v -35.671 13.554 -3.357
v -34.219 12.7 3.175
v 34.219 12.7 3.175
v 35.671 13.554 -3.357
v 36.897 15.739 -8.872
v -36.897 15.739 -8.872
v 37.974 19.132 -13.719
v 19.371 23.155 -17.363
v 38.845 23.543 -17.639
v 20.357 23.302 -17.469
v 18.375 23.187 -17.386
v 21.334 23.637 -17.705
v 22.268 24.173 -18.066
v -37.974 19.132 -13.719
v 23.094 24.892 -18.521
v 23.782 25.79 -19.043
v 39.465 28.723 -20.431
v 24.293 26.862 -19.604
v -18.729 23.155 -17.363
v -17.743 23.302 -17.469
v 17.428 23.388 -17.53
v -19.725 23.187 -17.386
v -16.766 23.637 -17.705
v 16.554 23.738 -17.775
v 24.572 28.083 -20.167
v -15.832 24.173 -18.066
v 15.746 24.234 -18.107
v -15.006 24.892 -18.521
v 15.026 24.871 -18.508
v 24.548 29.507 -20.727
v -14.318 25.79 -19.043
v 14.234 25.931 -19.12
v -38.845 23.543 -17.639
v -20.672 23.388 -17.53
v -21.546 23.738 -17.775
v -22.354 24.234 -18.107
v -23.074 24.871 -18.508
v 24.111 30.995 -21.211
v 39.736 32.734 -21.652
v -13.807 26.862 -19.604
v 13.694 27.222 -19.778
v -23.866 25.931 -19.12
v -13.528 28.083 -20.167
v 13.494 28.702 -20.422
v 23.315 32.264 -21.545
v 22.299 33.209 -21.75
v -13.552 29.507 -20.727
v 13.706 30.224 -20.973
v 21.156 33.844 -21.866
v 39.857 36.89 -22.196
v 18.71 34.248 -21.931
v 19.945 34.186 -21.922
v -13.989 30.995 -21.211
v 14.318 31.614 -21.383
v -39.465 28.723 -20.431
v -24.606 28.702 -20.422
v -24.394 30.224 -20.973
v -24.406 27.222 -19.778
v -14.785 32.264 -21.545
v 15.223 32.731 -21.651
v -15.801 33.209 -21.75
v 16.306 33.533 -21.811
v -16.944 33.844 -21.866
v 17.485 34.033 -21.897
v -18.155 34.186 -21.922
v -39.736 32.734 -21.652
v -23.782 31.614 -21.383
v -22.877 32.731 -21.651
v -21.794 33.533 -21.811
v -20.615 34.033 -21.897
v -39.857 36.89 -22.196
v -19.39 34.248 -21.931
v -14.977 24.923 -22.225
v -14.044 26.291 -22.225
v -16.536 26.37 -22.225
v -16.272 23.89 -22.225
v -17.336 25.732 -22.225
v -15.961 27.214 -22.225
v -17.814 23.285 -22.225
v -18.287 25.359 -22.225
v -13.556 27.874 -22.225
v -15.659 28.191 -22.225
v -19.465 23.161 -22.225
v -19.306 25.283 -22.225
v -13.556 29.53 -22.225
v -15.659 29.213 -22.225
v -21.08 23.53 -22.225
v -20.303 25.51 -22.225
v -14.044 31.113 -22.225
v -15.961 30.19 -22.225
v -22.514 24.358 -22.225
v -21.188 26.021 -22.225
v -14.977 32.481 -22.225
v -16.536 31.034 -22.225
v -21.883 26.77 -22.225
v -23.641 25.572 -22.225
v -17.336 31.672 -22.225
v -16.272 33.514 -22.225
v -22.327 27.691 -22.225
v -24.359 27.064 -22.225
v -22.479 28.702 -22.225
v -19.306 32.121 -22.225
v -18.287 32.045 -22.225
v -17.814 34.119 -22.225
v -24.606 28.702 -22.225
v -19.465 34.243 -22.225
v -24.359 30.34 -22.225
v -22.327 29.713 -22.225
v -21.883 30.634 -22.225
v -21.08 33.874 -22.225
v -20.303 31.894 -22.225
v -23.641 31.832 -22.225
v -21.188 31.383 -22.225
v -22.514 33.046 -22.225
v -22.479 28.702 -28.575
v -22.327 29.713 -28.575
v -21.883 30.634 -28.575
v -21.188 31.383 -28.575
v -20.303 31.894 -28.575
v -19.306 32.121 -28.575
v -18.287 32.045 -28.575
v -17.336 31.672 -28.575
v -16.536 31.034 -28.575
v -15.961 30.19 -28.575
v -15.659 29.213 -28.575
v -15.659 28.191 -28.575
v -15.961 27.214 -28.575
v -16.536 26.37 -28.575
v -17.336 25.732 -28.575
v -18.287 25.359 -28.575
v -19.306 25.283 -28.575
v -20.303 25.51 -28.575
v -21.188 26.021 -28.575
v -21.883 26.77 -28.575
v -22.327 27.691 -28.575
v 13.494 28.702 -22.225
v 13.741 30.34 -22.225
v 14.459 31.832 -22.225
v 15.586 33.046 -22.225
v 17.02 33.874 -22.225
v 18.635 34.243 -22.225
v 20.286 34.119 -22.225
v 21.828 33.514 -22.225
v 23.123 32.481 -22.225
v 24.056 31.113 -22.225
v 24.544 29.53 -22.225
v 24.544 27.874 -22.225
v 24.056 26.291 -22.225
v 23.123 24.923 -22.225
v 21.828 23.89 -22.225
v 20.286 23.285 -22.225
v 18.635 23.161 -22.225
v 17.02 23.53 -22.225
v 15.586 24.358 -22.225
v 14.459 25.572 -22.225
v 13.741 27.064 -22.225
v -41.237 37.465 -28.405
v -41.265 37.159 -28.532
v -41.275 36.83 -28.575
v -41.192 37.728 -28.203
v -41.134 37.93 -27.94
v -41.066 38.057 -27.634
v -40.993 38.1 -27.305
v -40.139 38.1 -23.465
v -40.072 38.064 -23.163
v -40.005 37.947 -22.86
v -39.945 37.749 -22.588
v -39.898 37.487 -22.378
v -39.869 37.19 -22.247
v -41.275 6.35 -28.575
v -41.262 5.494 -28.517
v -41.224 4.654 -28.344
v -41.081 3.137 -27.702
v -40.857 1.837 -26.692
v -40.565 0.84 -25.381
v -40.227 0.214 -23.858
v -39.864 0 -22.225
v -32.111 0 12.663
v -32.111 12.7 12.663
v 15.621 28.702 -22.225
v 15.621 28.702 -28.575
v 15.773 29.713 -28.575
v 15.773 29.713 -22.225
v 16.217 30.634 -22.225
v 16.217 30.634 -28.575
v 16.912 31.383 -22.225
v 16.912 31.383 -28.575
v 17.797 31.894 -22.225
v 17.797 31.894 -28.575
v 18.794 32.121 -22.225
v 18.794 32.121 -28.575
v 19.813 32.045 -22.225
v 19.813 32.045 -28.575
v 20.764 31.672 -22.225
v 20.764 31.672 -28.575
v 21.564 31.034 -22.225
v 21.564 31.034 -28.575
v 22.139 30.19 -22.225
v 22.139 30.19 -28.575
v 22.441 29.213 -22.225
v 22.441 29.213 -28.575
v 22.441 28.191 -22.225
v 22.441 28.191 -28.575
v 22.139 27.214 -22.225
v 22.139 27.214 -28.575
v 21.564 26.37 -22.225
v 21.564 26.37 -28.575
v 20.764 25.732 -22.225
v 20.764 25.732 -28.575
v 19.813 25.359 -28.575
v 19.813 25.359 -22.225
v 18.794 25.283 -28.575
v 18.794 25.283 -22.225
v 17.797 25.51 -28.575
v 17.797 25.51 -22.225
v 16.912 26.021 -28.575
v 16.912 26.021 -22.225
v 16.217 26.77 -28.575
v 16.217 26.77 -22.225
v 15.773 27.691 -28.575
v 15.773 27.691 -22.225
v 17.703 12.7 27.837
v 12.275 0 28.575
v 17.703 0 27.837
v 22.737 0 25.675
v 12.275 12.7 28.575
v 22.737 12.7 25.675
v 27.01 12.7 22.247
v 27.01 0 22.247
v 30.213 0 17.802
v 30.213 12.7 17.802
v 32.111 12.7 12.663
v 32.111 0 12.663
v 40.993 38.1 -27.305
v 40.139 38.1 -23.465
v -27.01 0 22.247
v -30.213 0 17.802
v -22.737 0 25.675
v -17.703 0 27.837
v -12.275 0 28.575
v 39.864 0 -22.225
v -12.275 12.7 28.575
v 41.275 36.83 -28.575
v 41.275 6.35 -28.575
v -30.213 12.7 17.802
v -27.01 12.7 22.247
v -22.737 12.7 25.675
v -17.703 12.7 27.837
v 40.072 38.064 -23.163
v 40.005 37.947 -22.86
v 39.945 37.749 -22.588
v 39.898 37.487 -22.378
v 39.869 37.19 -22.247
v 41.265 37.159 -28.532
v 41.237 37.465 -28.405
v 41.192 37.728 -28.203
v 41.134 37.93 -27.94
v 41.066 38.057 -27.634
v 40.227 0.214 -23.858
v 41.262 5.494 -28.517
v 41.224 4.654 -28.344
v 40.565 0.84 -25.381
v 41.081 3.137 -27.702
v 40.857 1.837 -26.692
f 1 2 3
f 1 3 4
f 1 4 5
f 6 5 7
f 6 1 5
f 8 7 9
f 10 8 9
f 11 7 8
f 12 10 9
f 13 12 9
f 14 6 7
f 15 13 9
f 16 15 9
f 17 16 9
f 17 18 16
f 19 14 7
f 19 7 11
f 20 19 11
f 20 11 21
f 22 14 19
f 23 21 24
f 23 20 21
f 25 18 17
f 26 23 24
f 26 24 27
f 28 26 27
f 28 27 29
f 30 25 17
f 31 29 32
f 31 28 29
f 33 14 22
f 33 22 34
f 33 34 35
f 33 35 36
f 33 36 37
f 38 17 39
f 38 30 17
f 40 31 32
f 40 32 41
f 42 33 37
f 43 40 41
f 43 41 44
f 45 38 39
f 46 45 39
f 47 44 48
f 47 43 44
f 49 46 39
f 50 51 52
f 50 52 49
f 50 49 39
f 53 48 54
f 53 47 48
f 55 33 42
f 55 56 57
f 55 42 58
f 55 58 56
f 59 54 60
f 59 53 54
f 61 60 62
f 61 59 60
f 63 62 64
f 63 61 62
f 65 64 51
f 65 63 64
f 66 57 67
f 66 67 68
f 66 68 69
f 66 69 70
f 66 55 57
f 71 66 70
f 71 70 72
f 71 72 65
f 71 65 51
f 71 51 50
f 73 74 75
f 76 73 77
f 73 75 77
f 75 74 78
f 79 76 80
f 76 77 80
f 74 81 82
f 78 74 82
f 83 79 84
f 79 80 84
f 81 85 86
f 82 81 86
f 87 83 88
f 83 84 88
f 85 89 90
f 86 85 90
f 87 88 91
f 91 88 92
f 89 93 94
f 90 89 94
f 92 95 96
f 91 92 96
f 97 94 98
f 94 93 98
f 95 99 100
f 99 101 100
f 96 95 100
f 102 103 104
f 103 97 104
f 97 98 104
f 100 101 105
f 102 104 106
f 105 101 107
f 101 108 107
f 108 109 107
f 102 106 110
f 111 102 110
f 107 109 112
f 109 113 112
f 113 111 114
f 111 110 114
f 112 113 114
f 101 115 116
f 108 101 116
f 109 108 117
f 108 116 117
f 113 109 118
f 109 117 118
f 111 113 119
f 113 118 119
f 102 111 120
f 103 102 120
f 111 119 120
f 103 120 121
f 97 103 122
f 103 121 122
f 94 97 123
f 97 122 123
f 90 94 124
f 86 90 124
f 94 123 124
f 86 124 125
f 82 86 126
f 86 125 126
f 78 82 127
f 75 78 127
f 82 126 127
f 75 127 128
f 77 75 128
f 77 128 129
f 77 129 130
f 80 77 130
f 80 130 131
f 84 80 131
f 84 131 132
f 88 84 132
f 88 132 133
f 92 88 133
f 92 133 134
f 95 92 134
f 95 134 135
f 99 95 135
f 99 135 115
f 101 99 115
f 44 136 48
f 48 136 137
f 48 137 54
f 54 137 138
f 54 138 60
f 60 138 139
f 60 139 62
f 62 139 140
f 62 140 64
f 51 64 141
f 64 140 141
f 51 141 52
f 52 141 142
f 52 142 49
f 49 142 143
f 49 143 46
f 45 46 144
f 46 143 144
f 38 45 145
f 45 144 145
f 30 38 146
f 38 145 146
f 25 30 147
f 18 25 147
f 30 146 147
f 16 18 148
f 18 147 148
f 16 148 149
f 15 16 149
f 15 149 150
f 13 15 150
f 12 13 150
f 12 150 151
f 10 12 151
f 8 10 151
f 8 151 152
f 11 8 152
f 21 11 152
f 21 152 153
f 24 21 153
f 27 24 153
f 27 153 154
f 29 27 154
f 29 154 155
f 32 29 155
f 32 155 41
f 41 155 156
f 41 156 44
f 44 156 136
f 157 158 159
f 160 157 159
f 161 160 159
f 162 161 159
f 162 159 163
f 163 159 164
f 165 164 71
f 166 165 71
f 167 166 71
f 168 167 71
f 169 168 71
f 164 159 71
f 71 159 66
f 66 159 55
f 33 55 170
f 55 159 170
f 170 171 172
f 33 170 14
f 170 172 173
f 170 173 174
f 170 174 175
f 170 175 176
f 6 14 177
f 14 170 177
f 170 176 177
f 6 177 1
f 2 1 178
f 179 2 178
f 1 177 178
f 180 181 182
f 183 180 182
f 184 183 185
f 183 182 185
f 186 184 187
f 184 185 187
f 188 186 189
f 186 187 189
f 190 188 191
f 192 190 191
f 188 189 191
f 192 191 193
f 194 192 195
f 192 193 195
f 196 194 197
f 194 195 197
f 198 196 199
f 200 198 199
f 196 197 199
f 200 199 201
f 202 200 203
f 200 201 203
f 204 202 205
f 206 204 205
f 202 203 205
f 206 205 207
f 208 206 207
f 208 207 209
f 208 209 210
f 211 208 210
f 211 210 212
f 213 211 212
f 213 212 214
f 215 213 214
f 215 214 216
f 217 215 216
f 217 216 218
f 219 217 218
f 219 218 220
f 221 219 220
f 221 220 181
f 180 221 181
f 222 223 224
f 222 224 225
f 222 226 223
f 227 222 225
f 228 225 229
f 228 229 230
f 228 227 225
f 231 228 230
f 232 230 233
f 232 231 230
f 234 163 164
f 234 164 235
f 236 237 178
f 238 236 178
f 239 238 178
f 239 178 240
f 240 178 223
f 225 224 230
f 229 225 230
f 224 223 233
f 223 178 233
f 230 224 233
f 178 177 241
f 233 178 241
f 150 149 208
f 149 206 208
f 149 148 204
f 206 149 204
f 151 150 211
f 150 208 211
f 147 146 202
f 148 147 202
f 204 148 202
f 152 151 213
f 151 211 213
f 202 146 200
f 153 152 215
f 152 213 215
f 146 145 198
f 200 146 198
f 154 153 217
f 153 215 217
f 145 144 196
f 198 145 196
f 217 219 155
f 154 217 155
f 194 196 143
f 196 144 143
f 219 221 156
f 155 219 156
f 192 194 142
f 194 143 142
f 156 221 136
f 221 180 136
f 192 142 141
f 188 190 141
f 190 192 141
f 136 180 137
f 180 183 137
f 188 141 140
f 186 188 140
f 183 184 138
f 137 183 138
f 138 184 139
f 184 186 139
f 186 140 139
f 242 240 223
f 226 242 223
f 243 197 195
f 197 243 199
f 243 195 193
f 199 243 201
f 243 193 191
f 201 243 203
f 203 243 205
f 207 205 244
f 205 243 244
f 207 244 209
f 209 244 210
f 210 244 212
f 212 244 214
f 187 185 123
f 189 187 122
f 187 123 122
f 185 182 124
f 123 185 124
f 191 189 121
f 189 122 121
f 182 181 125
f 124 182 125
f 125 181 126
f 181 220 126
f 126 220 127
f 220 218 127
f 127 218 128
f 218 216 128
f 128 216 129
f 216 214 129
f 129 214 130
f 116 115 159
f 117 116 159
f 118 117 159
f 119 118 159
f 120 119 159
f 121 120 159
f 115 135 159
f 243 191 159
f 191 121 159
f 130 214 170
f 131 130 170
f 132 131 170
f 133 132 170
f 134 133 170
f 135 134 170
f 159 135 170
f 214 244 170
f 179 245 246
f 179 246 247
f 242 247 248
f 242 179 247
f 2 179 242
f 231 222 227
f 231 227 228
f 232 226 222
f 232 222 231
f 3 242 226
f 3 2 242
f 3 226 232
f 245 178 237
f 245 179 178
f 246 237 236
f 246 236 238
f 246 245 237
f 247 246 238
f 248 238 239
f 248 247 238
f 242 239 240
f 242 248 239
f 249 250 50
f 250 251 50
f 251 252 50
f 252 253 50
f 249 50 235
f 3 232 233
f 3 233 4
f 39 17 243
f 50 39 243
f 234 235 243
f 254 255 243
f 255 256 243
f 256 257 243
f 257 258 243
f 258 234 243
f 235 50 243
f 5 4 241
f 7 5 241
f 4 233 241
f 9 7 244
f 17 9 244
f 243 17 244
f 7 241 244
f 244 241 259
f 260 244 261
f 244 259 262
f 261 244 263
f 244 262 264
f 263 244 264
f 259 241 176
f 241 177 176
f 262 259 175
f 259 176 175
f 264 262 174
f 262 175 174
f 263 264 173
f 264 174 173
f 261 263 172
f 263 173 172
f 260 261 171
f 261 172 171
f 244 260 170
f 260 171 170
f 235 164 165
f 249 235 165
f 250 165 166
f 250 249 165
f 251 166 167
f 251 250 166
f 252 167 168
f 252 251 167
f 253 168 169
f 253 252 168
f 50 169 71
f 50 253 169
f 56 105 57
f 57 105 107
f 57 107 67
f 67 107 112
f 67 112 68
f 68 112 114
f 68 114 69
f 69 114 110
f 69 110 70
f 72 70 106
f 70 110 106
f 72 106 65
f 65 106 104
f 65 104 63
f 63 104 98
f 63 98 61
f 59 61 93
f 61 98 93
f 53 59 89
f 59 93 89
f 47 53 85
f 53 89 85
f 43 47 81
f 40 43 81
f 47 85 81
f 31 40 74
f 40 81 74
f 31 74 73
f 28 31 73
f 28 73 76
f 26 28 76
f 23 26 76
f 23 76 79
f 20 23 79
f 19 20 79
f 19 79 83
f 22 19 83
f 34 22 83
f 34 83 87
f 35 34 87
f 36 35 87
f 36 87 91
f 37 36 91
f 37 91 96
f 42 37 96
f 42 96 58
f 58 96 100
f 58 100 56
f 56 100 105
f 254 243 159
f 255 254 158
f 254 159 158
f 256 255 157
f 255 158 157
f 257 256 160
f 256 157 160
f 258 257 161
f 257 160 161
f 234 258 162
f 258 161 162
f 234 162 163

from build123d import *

# Parameters (mm, degrees)
BOSS_EXTRUDE1_DEPTH     = 12.7
BOSS_EXTRUDE2_DEPTH     = 38.1
FILLET1_R               = 25.4
FILLET2_R               = 20.32
FILLET3_R               = 6.35
FILLET4_R               = 1.2699999999999994
CUT_EXTRUDE5_REACH      = 82.133
CUT_EXTRUDE5_END_RADIUS = 25.400000000000002
SKETCH6_R               = 3.4289999999999985
CUT_EXTRUDE6_REACH      = 77.736
CUT_EXTRUDE6_END_RADIUS = 25.400000000000002
SKETCH7_R               = 5.55625
SKETCH7_R_2             = 5.556250000000004


with BuildPart() as part:
    # Sketch1 → Boss-Extrude1 (new body)
    with BuildSketch(Plane(origin=(0, 0, 0), x_dir=(1, 0, 0), z_dir=(0, 1, 0))):
        Polygon((39.86388888888888, 22.225000000000012), (-39.86388888888888, 22.225), (-28.574999999999996, -28.57499999999998), (28.575000000000006, -28.574999999999978), align=None)
        Polygon((41.27499999999999, 28.575000000000014), (-41.275000000000006, 28.575000000000003), (-39.863888888888894, 22.225), (39.86388888888888, 22.225000000000012), align=None)
    extrude(amount=BOSS_EXTRUDE1_DEPTH)

    # Sketch1<5> → Boss-Extrude2 (add)
    with BuildSketch(Plane(origin=(0, 0, 0), x_dir=(1, 0, 0), z_dir=(0, 1, 0))):
        Polygon((41.27499999999999, 28.575000000000014), (-41.275000000000006, 28.575000000000003), (-39.863888888888894, 22.225), (39.86388888888888, 22.225000000000012), align=None)
    extrude(amount=BOSS_EXTRUDE2_DEPTH)

    # Fillet1
    fillet1_edges = [part.edges().sort_by_distance(p)[0] for p in [
        (0, 12.7, -22.22500000000001),
    ]]
    fillet(fillet1_edges, radius=FILLET1_R - 0.0001)  # a hair under: the kernel refuses the full size

    # Fillet2
    fillet2_edges = [part.edges().sort_by_distance(p)[0] for p in [
        (28.575000000000006, 6.35, 28.574999999999978),
        (-28.574999999999996, 6.35, 28.57499999999998),
    ]]
    fillet(fillet2_edges, radius=FILLET2_R)

    # Fillet3
    fillet3_edges = [part.edges().sort_by_distance(p)[0] for p in [
        (-7.11e-15, 0, -28.57500000000001),
    ]]
    fillet(fillet3_edges, radius=FILLET3_R)

    # Fillet4
    fillet4_edges = [part.edges().sort_by_distance(p)[0] for p in [
        (0, 38.1, -22.22500000000001),
        (-7.11e-15, 38.1, -28.57500000000001),
    ]]
    fillet(fillet4_edges, radius=FILLET4_R)

    # Cut-Extrude5: up to this cylinder (the profile starts outside it)
    cut_extrude5_end = Plane(origin=(3.97e-15, 38.1, 3.1749999999999905), z_dir=(-1, 0, 1.3e-16)) * Cylinder(CUT_EXTRUDE5_END_RADIUS, 254.166, mode=Mode.PRIVATE)
    # Sketch6 → Cut-Extrude5 (cut, up to the surface)
    with BuildSketch(Plane(origin=(-3.6e-15, 0, -28.57500000000001), x_dir=(-1, 0, 1.3e-16), z_dir=(-1.3e-16, 0, -1)), mode=Mode.PRIVATE) as cut_extrude5_sk1:
        with Locations((-19.05, 28.701999999999998)):
            Circle(SKETCH6_R)
    cut_extrude5_tool1 = extrude(cut_extrude5_sk1.sketch, amount=-CUT_EXTRUDE5_REACH, mode=Mode.PRIVATE) - cut_extrude5_end
    add(cut_extrude5_tool1.solids().sort_by_distance((19.05, 28.702, -28.575))[0], mode=Mode.SUBTRACT)
    # Sketch6 → Cut-Extrude5 (cut, up to the surface)
    with BuildSketch(Plane(origin=(-3.6e-15, 0, -28.57500000000001), x_dir=(-1, 0, 1.3e-16), z_dir=(-1.3e-16, 0, -1)), mode=Mode.PRIVATE) as cut_extrude5_sk2:
        with Locations((19.05, 28.701999999999998)):
            Circle(SKETCH6_R)
    cut_extrude5_tool2 = extrude(cut_extrude5_sk2.sketch, amount=-CUT_EXTRUDE5_REACH, mode=Mode.PRIVATE) - cut_extrude5_end
    add(cut_extrude5_tool2.solids().sort_by_distance((-19.05, 28.702, -28.575))[0], mode=Mode.SUBTRACT)

    # Cut-Extrude6: up to this cylinder (the profile starts outside it)
    cut_extrude6_end = Plane(origin=(3.97e-15, 38.1, 3.1749999999999905), z_dir=(-1, 0, 1.3e-16)) * Cylinder(CUT_EXTRUDE6_END_RADIUS, 245.372, mode=Mode.PRIVATE)
    # Sketch7 → Cut-Extrude6 (cut, up to the surface)
    with BuildSketch(Plane(origin=(-2.8e-15, 0, -22.22500000000001), x_dir=(-1, 0, 1.3e-16), z_dir=(-1.3e-16, 0, -1)), mode=Mode.PRIVATE) as cut_extrude6_sk1:
        with Locations((-19.05, 28.701999999999998)):
            Circle(SKETCH7_R)
    cut_extrude6_tool1 = extrude(cut_extrude6_sk1.sketch, amount=-CUT_EXTRUDE6_REACH, mode=Mode.PRIVATE) - cut_extrude6_end
    add(cut_extrude6_tool1.solids().sort_by_distance((19.05, 28.702, -22.225))[0], mode=Mode.SUBTRACT)
    # Sketch7 → Cut-Extrude6 (cut, up to the surface)
    with BuildSketch(Plane(origin=(-2.8e-15, 0, -22.22500000000001), x_dir=(-1, 0, 1.3e-16), z_dir=(-1.3e-16, 0, -1)), mode=Mode.PRIVATE) as cut_extrude6_sk2:
        with Locations((19.05, 28.701999999999998)):
            Circle(SKETCH7_R_2)
    cut_extrude6_tool2 = extrude(cut_extrude6_sk2.sketch, amount=-CUT_EXTRUDE6_REACH, mode=Mode.PRIVATE) - cut_extrude6_end
    add(cut_extrude6_tool2.solids().sort_by_distance((-19.05, 28.702, -22.225))[0], mode=Mode.SUBTRACT)


solid = part.part
